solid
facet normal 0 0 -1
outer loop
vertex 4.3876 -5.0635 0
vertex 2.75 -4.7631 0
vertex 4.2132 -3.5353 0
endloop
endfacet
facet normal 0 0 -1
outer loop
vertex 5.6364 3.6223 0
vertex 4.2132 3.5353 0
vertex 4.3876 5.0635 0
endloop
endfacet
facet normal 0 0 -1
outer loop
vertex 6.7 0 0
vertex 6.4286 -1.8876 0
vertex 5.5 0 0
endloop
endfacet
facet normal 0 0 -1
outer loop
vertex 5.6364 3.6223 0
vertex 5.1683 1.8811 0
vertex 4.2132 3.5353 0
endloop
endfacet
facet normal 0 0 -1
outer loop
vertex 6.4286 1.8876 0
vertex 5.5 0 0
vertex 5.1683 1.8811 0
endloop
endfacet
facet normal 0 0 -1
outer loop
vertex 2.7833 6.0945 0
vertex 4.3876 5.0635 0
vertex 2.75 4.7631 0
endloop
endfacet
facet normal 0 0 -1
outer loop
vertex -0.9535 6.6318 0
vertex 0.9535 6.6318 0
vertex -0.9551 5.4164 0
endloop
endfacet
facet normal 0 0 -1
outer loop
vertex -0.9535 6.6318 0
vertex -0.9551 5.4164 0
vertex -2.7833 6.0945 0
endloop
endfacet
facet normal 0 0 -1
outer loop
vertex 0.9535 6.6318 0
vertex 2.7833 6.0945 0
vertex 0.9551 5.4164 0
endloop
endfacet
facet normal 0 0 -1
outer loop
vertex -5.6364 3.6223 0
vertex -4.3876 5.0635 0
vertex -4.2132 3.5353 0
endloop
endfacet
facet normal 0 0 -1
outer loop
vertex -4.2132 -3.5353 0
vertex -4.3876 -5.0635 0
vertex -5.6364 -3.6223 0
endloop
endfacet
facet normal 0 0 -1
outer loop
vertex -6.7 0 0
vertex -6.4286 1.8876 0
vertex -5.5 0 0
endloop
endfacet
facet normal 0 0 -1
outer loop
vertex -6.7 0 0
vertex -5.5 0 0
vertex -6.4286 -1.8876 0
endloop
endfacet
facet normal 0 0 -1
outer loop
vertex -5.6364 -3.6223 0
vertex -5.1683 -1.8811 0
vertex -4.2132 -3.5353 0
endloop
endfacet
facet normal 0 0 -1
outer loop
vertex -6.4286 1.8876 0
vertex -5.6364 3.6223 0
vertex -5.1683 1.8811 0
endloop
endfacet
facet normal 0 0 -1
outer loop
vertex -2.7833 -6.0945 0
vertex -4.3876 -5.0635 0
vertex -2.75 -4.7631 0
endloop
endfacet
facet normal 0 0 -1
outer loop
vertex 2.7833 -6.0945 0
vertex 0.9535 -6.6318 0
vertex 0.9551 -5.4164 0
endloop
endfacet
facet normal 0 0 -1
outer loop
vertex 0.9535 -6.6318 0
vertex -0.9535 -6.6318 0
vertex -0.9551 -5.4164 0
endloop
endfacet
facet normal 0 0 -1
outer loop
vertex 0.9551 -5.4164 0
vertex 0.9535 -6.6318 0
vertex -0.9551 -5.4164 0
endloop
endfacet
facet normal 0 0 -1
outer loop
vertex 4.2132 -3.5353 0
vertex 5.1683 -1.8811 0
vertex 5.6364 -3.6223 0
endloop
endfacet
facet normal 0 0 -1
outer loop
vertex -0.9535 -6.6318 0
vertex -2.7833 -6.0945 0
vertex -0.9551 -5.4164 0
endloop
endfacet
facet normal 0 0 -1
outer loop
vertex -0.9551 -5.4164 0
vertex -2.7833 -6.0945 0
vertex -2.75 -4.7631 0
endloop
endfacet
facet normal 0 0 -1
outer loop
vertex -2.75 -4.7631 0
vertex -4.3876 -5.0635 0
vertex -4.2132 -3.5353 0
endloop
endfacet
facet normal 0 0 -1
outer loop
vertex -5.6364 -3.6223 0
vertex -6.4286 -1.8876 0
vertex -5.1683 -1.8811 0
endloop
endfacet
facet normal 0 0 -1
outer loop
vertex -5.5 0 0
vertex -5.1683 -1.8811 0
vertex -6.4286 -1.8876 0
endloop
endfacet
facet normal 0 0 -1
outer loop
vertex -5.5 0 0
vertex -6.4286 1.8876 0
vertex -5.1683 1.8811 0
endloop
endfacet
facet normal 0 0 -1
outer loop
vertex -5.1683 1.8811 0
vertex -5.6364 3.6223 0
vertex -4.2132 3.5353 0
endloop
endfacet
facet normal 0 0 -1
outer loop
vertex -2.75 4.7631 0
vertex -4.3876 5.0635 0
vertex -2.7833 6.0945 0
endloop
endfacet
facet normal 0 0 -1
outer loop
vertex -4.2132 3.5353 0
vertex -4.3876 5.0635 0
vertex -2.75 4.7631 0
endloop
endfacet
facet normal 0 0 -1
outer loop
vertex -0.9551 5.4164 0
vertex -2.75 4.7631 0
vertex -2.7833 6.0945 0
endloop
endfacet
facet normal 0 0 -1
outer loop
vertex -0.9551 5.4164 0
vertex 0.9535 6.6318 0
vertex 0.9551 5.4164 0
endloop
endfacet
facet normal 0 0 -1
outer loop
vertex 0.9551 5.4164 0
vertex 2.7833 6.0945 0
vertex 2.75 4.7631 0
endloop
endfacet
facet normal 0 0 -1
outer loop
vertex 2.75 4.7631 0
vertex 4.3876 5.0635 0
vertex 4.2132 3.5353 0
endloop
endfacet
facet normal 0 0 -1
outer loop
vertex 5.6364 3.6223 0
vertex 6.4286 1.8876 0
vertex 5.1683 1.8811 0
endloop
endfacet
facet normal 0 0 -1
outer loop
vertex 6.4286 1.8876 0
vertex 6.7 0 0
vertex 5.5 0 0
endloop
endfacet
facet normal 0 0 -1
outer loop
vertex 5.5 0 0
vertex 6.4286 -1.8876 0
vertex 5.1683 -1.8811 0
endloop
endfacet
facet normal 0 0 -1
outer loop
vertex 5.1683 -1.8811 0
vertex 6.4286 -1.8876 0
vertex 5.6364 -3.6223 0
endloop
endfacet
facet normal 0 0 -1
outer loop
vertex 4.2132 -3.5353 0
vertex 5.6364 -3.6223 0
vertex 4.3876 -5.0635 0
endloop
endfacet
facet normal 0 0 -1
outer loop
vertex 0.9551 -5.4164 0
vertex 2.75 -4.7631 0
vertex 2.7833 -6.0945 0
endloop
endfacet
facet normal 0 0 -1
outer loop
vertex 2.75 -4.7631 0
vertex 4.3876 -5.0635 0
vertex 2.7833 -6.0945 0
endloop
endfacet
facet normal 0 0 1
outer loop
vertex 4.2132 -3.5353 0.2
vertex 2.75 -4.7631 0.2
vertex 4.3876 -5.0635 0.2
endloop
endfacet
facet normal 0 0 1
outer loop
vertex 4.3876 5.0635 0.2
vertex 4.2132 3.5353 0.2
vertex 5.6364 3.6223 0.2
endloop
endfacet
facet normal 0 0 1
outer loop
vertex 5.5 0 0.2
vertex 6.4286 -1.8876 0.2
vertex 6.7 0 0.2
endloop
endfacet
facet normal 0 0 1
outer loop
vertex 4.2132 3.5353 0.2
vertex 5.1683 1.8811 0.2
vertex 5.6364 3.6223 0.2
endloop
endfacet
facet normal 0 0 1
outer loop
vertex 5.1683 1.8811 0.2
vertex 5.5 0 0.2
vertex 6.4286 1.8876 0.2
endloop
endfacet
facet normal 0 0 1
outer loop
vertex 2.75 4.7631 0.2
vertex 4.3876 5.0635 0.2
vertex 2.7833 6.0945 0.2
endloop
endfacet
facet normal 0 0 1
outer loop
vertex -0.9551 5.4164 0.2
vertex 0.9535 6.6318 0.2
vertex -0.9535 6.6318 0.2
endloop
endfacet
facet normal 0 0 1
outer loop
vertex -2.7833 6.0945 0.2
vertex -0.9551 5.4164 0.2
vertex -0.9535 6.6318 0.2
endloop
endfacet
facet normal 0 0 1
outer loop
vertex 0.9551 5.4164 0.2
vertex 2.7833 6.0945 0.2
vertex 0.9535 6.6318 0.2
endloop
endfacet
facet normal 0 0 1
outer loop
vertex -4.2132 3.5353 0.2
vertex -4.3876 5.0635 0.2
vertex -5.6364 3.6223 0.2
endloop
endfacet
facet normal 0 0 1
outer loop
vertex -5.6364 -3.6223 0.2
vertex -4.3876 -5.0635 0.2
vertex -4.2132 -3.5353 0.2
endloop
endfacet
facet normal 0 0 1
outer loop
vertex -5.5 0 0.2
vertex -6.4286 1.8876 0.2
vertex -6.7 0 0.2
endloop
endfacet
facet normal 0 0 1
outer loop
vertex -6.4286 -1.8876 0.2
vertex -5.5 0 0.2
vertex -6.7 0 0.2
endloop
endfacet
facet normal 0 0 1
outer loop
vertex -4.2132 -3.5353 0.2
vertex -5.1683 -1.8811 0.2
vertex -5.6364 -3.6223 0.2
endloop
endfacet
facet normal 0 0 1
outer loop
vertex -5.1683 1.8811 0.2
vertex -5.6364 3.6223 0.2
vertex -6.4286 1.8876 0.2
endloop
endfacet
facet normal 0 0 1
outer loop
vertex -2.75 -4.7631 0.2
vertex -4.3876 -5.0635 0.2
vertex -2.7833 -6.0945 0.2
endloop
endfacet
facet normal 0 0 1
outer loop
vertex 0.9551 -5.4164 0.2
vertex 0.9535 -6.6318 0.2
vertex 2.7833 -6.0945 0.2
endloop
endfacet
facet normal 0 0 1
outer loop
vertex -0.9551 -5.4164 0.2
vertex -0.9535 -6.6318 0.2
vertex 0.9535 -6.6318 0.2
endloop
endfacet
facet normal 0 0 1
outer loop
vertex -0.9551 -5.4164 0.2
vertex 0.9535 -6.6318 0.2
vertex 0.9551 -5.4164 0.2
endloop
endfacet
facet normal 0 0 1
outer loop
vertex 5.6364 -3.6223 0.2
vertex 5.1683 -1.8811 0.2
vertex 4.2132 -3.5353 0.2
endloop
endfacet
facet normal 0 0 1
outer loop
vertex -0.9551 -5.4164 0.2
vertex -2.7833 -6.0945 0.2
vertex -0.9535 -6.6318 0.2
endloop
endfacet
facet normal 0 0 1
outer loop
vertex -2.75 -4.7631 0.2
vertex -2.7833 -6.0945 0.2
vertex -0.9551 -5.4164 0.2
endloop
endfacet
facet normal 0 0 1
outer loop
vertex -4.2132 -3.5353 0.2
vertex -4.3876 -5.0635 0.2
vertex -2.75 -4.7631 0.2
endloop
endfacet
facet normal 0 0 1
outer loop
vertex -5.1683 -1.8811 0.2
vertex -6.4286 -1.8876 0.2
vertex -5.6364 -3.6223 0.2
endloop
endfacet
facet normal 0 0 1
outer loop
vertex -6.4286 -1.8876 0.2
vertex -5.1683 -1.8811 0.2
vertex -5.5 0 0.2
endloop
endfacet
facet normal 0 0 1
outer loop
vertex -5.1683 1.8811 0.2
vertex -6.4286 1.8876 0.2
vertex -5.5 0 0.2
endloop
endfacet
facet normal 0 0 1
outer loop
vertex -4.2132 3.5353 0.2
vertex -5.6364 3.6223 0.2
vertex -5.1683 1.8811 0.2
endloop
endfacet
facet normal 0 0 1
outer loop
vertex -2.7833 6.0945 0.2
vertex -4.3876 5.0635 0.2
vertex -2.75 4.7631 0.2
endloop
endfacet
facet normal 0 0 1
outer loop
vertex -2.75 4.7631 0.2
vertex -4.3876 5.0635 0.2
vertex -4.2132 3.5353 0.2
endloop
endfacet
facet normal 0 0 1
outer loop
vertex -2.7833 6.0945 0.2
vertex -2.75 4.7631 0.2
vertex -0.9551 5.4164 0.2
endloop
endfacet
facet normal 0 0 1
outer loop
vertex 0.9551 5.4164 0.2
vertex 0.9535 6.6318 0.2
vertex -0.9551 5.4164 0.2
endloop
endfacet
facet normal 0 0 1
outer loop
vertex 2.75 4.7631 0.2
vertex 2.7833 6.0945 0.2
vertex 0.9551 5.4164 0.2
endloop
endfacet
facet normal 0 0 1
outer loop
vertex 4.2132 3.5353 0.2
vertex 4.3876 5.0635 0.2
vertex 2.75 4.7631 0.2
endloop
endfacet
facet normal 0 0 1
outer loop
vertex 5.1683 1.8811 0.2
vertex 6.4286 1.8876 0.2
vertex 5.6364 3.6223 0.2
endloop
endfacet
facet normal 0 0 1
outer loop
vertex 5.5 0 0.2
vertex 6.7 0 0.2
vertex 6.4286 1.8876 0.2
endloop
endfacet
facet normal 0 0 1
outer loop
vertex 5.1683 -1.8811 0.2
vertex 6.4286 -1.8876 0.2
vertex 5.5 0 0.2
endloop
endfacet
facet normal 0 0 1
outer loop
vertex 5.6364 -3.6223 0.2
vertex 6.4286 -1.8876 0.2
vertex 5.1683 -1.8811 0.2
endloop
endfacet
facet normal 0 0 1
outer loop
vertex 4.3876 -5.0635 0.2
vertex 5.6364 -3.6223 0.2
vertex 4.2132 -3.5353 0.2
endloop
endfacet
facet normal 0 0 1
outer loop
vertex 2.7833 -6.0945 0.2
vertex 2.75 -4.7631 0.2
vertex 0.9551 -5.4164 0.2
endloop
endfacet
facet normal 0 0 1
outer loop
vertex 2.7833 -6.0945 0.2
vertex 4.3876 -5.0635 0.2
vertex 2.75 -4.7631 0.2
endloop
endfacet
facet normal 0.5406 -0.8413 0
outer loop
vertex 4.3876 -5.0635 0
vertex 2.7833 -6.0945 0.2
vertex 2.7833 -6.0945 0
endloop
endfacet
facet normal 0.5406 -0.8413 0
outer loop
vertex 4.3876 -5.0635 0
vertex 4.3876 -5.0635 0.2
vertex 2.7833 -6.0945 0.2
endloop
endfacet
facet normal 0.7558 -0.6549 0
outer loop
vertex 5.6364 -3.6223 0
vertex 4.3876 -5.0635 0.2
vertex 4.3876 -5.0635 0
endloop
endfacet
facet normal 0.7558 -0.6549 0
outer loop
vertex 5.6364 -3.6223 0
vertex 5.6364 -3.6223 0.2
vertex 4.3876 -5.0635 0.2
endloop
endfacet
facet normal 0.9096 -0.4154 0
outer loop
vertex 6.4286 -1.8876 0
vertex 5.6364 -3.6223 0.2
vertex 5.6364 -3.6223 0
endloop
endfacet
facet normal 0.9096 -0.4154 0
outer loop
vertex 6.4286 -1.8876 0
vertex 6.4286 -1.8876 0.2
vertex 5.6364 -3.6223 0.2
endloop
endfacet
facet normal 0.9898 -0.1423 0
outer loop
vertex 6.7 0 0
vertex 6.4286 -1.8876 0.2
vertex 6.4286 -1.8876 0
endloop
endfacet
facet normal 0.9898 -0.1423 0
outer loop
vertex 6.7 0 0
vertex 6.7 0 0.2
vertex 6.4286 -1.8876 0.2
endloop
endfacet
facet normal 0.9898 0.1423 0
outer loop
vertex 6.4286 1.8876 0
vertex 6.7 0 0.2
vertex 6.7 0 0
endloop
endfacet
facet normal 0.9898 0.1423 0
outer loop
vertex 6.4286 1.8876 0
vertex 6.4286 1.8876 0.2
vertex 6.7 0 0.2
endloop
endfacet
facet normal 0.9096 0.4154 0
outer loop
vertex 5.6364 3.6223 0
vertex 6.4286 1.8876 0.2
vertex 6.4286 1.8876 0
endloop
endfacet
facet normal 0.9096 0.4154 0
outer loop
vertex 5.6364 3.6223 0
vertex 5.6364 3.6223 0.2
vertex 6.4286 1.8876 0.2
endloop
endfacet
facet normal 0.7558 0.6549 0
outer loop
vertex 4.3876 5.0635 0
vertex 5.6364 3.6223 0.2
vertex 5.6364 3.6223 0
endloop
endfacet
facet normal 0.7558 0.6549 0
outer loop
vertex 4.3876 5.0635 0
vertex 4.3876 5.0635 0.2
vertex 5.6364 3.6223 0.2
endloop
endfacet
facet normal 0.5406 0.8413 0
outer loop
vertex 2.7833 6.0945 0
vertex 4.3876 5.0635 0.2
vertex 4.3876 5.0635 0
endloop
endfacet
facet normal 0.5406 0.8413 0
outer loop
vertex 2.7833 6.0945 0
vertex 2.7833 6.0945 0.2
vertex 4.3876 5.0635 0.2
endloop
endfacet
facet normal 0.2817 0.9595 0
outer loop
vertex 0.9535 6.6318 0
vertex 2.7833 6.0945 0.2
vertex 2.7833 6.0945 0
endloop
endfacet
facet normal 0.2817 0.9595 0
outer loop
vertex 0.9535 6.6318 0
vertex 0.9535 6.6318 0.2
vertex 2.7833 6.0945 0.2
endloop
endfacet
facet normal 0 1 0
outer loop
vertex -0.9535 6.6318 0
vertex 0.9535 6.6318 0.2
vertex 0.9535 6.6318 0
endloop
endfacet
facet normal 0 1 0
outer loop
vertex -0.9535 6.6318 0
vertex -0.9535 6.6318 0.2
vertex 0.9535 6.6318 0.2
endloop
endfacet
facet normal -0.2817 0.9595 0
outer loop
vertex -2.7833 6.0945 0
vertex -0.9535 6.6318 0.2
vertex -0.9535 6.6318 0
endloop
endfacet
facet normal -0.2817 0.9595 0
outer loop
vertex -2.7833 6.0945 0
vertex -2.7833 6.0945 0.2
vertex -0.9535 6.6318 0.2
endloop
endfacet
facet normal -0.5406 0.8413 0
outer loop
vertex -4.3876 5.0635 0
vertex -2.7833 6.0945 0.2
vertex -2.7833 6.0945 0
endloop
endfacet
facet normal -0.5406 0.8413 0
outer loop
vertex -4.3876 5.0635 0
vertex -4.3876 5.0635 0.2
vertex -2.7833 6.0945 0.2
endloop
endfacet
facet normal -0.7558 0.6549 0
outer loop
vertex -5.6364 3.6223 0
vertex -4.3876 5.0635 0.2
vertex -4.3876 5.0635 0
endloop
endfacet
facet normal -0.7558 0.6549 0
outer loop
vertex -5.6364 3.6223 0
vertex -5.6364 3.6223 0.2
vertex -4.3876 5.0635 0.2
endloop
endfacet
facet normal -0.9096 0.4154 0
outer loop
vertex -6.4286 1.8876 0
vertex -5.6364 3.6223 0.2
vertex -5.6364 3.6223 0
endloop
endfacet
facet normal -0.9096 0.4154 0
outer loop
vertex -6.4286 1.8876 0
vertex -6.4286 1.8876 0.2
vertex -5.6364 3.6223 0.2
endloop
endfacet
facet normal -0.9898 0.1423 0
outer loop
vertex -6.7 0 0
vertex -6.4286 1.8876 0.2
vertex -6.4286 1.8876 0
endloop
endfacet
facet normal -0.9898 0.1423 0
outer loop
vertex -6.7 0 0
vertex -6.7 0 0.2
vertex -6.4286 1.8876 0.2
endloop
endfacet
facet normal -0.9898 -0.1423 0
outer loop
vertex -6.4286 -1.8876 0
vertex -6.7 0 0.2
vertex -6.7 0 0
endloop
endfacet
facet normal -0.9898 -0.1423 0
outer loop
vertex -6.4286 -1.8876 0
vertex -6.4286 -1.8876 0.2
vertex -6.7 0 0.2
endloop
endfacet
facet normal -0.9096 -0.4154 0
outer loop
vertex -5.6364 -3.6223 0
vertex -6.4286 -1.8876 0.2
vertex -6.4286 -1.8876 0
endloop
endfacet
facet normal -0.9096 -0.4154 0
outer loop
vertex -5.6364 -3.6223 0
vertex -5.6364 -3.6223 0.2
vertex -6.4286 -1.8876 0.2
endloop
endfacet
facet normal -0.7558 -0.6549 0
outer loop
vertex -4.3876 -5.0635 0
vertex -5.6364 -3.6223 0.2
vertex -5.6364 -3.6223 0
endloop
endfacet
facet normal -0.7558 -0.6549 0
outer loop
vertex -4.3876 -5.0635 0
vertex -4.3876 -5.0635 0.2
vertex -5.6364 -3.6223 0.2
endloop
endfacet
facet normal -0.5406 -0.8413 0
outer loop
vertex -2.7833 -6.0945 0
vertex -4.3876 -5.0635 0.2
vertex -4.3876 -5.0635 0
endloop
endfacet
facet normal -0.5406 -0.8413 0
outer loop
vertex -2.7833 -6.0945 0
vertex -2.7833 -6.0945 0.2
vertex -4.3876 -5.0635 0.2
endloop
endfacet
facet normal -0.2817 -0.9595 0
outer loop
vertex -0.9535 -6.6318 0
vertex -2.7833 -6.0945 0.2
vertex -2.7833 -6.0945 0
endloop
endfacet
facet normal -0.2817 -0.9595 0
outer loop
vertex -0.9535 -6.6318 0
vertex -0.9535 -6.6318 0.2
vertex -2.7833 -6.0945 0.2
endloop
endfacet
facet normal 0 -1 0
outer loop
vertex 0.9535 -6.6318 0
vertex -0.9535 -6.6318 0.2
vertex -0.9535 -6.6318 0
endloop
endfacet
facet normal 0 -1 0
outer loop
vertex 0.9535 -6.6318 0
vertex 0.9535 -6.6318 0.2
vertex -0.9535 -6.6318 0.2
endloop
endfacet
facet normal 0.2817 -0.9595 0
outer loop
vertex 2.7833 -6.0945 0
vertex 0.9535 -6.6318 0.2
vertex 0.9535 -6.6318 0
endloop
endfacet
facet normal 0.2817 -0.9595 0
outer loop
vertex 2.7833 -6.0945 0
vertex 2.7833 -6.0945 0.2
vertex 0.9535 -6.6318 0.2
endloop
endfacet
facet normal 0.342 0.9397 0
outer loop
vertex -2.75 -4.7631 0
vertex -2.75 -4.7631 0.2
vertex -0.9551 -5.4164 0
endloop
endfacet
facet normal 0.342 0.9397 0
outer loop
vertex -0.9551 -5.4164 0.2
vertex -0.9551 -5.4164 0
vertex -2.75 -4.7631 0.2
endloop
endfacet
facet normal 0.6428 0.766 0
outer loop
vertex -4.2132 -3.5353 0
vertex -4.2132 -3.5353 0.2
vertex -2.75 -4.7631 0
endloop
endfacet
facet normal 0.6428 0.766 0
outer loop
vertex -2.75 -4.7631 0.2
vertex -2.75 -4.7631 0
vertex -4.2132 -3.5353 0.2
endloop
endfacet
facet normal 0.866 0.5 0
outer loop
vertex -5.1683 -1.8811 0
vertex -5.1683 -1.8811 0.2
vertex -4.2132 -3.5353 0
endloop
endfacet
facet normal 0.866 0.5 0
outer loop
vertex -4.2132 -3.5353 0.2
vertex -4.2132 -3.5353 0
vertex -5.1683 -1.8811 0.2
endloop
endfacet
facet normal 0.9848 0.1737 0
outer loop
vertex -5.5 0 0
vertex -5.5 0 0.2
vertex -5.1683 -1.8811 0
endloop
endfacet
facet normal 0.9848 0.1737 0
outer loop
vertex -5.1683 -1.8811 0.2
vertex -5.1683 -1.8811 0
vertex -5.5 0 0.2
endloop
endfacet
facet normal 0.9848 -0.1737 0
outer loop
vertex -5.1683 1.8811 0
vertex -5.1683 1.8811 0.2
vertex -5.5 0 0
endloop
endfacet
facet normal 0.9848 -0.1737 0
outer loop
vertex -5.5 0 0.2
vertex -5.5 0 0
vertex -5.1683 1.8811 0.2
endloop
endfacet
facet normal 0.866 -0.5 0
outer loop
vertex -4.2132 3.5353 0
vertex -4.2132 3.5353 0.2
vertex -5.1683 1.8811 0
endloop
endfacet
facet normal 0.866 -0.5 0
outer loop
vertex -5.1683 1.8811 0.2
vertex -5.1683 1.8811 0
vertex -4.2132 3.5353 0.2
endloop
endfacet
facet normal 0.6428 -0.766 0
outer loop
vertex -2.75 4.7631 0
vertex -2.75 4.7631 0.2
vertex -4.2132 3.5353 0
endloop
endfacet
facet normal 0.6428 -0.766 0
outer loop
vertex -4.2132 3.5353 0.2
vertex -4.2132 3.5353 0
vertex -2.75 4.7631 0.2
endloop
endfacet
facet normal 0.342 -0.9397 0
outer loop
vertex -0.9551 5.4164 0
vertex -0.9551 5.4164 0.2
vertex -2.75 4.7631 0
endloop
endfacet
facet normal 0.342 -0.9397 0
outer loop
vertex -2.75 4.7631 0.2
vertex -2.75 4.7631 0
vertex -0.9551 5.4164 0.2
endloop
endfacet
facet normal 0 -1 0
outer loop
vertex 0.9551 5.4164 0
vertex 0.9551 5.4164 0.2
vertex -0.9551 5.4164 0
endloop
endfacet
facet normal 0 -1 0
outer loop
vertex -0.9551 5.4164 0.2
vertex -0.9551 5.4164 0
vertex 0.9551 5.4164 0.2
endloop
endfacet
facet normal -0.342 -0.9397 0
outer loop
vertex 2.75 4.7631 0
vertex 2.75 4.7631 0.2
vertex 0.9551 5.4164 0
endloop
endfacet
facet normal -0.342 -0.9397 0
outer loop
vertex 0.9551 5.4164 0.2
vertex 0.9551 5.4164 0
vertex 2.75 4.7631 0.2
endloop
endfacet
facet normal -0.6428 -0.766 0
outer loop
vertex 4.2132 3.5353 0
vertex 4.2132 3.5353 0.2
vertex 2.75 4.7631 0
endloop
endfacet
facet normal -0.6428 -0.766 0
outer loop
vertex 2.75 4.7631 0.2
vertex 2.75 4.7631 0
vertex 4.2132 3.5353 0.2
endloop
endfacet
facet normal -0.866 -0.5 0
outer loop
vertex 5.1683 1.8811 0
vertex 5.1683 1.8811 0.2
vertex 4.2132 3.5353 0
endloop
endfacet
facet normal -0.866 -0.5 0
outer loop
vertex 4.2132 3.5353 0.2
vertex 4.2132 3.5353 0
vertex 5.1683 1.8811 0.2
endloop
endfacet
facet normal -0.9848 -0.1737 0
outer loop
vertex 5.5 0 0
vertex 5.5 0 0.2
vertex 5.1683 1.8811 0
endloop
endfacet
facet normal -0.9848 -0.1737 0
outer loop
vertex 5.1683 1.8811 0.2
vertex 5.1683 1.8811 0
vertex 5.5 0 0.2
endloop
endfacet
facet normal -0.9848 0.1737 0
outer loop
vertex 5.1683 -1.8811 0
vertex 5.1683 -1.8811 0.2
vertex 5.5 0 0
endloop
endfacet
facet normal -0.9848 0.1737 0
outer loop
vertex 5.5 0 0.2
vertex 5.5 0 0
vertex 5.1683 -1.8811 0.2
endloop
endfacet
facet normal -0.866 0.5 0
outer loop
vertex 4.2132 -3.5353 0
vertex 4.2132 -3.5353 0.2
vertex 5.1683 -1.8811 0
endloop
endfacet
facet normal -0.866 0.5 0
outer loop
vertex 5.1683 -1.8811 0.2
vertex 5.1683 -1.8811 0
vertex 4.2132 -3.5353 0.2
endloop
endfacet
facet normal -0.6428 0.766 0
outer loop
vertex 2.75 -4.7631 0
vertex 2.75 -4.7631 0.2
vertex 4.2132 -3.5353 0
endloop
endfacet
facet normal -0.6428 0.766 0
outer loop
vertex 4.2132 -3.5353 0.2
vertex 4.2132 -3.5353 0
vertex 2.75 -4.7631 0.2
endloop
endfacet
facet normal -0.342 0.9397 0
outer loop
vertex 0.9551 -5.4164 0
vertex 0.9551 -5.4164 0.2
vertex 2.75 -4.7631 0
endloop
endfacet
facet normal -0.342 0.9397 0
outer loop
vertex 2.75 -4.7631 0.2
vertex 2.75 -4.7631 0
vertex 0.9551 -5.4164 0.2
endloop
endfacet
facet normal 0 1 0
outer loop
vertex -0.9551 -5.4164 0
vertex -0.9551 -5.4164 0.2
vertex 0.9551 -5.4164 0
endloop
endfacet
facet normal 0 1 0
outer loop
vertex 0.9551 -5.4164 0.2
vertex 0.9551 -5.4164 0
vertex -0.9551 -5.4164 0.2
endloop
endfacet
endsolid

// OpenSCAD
module centreRing(out_dia, in_dia, thickness)
{
    linear_extrude(thickness)
    difference()
    {
        circle(out_dia/2);
        circle(in_dia/2);
    }
}

centreRing(13.4, 11, 0.2);
